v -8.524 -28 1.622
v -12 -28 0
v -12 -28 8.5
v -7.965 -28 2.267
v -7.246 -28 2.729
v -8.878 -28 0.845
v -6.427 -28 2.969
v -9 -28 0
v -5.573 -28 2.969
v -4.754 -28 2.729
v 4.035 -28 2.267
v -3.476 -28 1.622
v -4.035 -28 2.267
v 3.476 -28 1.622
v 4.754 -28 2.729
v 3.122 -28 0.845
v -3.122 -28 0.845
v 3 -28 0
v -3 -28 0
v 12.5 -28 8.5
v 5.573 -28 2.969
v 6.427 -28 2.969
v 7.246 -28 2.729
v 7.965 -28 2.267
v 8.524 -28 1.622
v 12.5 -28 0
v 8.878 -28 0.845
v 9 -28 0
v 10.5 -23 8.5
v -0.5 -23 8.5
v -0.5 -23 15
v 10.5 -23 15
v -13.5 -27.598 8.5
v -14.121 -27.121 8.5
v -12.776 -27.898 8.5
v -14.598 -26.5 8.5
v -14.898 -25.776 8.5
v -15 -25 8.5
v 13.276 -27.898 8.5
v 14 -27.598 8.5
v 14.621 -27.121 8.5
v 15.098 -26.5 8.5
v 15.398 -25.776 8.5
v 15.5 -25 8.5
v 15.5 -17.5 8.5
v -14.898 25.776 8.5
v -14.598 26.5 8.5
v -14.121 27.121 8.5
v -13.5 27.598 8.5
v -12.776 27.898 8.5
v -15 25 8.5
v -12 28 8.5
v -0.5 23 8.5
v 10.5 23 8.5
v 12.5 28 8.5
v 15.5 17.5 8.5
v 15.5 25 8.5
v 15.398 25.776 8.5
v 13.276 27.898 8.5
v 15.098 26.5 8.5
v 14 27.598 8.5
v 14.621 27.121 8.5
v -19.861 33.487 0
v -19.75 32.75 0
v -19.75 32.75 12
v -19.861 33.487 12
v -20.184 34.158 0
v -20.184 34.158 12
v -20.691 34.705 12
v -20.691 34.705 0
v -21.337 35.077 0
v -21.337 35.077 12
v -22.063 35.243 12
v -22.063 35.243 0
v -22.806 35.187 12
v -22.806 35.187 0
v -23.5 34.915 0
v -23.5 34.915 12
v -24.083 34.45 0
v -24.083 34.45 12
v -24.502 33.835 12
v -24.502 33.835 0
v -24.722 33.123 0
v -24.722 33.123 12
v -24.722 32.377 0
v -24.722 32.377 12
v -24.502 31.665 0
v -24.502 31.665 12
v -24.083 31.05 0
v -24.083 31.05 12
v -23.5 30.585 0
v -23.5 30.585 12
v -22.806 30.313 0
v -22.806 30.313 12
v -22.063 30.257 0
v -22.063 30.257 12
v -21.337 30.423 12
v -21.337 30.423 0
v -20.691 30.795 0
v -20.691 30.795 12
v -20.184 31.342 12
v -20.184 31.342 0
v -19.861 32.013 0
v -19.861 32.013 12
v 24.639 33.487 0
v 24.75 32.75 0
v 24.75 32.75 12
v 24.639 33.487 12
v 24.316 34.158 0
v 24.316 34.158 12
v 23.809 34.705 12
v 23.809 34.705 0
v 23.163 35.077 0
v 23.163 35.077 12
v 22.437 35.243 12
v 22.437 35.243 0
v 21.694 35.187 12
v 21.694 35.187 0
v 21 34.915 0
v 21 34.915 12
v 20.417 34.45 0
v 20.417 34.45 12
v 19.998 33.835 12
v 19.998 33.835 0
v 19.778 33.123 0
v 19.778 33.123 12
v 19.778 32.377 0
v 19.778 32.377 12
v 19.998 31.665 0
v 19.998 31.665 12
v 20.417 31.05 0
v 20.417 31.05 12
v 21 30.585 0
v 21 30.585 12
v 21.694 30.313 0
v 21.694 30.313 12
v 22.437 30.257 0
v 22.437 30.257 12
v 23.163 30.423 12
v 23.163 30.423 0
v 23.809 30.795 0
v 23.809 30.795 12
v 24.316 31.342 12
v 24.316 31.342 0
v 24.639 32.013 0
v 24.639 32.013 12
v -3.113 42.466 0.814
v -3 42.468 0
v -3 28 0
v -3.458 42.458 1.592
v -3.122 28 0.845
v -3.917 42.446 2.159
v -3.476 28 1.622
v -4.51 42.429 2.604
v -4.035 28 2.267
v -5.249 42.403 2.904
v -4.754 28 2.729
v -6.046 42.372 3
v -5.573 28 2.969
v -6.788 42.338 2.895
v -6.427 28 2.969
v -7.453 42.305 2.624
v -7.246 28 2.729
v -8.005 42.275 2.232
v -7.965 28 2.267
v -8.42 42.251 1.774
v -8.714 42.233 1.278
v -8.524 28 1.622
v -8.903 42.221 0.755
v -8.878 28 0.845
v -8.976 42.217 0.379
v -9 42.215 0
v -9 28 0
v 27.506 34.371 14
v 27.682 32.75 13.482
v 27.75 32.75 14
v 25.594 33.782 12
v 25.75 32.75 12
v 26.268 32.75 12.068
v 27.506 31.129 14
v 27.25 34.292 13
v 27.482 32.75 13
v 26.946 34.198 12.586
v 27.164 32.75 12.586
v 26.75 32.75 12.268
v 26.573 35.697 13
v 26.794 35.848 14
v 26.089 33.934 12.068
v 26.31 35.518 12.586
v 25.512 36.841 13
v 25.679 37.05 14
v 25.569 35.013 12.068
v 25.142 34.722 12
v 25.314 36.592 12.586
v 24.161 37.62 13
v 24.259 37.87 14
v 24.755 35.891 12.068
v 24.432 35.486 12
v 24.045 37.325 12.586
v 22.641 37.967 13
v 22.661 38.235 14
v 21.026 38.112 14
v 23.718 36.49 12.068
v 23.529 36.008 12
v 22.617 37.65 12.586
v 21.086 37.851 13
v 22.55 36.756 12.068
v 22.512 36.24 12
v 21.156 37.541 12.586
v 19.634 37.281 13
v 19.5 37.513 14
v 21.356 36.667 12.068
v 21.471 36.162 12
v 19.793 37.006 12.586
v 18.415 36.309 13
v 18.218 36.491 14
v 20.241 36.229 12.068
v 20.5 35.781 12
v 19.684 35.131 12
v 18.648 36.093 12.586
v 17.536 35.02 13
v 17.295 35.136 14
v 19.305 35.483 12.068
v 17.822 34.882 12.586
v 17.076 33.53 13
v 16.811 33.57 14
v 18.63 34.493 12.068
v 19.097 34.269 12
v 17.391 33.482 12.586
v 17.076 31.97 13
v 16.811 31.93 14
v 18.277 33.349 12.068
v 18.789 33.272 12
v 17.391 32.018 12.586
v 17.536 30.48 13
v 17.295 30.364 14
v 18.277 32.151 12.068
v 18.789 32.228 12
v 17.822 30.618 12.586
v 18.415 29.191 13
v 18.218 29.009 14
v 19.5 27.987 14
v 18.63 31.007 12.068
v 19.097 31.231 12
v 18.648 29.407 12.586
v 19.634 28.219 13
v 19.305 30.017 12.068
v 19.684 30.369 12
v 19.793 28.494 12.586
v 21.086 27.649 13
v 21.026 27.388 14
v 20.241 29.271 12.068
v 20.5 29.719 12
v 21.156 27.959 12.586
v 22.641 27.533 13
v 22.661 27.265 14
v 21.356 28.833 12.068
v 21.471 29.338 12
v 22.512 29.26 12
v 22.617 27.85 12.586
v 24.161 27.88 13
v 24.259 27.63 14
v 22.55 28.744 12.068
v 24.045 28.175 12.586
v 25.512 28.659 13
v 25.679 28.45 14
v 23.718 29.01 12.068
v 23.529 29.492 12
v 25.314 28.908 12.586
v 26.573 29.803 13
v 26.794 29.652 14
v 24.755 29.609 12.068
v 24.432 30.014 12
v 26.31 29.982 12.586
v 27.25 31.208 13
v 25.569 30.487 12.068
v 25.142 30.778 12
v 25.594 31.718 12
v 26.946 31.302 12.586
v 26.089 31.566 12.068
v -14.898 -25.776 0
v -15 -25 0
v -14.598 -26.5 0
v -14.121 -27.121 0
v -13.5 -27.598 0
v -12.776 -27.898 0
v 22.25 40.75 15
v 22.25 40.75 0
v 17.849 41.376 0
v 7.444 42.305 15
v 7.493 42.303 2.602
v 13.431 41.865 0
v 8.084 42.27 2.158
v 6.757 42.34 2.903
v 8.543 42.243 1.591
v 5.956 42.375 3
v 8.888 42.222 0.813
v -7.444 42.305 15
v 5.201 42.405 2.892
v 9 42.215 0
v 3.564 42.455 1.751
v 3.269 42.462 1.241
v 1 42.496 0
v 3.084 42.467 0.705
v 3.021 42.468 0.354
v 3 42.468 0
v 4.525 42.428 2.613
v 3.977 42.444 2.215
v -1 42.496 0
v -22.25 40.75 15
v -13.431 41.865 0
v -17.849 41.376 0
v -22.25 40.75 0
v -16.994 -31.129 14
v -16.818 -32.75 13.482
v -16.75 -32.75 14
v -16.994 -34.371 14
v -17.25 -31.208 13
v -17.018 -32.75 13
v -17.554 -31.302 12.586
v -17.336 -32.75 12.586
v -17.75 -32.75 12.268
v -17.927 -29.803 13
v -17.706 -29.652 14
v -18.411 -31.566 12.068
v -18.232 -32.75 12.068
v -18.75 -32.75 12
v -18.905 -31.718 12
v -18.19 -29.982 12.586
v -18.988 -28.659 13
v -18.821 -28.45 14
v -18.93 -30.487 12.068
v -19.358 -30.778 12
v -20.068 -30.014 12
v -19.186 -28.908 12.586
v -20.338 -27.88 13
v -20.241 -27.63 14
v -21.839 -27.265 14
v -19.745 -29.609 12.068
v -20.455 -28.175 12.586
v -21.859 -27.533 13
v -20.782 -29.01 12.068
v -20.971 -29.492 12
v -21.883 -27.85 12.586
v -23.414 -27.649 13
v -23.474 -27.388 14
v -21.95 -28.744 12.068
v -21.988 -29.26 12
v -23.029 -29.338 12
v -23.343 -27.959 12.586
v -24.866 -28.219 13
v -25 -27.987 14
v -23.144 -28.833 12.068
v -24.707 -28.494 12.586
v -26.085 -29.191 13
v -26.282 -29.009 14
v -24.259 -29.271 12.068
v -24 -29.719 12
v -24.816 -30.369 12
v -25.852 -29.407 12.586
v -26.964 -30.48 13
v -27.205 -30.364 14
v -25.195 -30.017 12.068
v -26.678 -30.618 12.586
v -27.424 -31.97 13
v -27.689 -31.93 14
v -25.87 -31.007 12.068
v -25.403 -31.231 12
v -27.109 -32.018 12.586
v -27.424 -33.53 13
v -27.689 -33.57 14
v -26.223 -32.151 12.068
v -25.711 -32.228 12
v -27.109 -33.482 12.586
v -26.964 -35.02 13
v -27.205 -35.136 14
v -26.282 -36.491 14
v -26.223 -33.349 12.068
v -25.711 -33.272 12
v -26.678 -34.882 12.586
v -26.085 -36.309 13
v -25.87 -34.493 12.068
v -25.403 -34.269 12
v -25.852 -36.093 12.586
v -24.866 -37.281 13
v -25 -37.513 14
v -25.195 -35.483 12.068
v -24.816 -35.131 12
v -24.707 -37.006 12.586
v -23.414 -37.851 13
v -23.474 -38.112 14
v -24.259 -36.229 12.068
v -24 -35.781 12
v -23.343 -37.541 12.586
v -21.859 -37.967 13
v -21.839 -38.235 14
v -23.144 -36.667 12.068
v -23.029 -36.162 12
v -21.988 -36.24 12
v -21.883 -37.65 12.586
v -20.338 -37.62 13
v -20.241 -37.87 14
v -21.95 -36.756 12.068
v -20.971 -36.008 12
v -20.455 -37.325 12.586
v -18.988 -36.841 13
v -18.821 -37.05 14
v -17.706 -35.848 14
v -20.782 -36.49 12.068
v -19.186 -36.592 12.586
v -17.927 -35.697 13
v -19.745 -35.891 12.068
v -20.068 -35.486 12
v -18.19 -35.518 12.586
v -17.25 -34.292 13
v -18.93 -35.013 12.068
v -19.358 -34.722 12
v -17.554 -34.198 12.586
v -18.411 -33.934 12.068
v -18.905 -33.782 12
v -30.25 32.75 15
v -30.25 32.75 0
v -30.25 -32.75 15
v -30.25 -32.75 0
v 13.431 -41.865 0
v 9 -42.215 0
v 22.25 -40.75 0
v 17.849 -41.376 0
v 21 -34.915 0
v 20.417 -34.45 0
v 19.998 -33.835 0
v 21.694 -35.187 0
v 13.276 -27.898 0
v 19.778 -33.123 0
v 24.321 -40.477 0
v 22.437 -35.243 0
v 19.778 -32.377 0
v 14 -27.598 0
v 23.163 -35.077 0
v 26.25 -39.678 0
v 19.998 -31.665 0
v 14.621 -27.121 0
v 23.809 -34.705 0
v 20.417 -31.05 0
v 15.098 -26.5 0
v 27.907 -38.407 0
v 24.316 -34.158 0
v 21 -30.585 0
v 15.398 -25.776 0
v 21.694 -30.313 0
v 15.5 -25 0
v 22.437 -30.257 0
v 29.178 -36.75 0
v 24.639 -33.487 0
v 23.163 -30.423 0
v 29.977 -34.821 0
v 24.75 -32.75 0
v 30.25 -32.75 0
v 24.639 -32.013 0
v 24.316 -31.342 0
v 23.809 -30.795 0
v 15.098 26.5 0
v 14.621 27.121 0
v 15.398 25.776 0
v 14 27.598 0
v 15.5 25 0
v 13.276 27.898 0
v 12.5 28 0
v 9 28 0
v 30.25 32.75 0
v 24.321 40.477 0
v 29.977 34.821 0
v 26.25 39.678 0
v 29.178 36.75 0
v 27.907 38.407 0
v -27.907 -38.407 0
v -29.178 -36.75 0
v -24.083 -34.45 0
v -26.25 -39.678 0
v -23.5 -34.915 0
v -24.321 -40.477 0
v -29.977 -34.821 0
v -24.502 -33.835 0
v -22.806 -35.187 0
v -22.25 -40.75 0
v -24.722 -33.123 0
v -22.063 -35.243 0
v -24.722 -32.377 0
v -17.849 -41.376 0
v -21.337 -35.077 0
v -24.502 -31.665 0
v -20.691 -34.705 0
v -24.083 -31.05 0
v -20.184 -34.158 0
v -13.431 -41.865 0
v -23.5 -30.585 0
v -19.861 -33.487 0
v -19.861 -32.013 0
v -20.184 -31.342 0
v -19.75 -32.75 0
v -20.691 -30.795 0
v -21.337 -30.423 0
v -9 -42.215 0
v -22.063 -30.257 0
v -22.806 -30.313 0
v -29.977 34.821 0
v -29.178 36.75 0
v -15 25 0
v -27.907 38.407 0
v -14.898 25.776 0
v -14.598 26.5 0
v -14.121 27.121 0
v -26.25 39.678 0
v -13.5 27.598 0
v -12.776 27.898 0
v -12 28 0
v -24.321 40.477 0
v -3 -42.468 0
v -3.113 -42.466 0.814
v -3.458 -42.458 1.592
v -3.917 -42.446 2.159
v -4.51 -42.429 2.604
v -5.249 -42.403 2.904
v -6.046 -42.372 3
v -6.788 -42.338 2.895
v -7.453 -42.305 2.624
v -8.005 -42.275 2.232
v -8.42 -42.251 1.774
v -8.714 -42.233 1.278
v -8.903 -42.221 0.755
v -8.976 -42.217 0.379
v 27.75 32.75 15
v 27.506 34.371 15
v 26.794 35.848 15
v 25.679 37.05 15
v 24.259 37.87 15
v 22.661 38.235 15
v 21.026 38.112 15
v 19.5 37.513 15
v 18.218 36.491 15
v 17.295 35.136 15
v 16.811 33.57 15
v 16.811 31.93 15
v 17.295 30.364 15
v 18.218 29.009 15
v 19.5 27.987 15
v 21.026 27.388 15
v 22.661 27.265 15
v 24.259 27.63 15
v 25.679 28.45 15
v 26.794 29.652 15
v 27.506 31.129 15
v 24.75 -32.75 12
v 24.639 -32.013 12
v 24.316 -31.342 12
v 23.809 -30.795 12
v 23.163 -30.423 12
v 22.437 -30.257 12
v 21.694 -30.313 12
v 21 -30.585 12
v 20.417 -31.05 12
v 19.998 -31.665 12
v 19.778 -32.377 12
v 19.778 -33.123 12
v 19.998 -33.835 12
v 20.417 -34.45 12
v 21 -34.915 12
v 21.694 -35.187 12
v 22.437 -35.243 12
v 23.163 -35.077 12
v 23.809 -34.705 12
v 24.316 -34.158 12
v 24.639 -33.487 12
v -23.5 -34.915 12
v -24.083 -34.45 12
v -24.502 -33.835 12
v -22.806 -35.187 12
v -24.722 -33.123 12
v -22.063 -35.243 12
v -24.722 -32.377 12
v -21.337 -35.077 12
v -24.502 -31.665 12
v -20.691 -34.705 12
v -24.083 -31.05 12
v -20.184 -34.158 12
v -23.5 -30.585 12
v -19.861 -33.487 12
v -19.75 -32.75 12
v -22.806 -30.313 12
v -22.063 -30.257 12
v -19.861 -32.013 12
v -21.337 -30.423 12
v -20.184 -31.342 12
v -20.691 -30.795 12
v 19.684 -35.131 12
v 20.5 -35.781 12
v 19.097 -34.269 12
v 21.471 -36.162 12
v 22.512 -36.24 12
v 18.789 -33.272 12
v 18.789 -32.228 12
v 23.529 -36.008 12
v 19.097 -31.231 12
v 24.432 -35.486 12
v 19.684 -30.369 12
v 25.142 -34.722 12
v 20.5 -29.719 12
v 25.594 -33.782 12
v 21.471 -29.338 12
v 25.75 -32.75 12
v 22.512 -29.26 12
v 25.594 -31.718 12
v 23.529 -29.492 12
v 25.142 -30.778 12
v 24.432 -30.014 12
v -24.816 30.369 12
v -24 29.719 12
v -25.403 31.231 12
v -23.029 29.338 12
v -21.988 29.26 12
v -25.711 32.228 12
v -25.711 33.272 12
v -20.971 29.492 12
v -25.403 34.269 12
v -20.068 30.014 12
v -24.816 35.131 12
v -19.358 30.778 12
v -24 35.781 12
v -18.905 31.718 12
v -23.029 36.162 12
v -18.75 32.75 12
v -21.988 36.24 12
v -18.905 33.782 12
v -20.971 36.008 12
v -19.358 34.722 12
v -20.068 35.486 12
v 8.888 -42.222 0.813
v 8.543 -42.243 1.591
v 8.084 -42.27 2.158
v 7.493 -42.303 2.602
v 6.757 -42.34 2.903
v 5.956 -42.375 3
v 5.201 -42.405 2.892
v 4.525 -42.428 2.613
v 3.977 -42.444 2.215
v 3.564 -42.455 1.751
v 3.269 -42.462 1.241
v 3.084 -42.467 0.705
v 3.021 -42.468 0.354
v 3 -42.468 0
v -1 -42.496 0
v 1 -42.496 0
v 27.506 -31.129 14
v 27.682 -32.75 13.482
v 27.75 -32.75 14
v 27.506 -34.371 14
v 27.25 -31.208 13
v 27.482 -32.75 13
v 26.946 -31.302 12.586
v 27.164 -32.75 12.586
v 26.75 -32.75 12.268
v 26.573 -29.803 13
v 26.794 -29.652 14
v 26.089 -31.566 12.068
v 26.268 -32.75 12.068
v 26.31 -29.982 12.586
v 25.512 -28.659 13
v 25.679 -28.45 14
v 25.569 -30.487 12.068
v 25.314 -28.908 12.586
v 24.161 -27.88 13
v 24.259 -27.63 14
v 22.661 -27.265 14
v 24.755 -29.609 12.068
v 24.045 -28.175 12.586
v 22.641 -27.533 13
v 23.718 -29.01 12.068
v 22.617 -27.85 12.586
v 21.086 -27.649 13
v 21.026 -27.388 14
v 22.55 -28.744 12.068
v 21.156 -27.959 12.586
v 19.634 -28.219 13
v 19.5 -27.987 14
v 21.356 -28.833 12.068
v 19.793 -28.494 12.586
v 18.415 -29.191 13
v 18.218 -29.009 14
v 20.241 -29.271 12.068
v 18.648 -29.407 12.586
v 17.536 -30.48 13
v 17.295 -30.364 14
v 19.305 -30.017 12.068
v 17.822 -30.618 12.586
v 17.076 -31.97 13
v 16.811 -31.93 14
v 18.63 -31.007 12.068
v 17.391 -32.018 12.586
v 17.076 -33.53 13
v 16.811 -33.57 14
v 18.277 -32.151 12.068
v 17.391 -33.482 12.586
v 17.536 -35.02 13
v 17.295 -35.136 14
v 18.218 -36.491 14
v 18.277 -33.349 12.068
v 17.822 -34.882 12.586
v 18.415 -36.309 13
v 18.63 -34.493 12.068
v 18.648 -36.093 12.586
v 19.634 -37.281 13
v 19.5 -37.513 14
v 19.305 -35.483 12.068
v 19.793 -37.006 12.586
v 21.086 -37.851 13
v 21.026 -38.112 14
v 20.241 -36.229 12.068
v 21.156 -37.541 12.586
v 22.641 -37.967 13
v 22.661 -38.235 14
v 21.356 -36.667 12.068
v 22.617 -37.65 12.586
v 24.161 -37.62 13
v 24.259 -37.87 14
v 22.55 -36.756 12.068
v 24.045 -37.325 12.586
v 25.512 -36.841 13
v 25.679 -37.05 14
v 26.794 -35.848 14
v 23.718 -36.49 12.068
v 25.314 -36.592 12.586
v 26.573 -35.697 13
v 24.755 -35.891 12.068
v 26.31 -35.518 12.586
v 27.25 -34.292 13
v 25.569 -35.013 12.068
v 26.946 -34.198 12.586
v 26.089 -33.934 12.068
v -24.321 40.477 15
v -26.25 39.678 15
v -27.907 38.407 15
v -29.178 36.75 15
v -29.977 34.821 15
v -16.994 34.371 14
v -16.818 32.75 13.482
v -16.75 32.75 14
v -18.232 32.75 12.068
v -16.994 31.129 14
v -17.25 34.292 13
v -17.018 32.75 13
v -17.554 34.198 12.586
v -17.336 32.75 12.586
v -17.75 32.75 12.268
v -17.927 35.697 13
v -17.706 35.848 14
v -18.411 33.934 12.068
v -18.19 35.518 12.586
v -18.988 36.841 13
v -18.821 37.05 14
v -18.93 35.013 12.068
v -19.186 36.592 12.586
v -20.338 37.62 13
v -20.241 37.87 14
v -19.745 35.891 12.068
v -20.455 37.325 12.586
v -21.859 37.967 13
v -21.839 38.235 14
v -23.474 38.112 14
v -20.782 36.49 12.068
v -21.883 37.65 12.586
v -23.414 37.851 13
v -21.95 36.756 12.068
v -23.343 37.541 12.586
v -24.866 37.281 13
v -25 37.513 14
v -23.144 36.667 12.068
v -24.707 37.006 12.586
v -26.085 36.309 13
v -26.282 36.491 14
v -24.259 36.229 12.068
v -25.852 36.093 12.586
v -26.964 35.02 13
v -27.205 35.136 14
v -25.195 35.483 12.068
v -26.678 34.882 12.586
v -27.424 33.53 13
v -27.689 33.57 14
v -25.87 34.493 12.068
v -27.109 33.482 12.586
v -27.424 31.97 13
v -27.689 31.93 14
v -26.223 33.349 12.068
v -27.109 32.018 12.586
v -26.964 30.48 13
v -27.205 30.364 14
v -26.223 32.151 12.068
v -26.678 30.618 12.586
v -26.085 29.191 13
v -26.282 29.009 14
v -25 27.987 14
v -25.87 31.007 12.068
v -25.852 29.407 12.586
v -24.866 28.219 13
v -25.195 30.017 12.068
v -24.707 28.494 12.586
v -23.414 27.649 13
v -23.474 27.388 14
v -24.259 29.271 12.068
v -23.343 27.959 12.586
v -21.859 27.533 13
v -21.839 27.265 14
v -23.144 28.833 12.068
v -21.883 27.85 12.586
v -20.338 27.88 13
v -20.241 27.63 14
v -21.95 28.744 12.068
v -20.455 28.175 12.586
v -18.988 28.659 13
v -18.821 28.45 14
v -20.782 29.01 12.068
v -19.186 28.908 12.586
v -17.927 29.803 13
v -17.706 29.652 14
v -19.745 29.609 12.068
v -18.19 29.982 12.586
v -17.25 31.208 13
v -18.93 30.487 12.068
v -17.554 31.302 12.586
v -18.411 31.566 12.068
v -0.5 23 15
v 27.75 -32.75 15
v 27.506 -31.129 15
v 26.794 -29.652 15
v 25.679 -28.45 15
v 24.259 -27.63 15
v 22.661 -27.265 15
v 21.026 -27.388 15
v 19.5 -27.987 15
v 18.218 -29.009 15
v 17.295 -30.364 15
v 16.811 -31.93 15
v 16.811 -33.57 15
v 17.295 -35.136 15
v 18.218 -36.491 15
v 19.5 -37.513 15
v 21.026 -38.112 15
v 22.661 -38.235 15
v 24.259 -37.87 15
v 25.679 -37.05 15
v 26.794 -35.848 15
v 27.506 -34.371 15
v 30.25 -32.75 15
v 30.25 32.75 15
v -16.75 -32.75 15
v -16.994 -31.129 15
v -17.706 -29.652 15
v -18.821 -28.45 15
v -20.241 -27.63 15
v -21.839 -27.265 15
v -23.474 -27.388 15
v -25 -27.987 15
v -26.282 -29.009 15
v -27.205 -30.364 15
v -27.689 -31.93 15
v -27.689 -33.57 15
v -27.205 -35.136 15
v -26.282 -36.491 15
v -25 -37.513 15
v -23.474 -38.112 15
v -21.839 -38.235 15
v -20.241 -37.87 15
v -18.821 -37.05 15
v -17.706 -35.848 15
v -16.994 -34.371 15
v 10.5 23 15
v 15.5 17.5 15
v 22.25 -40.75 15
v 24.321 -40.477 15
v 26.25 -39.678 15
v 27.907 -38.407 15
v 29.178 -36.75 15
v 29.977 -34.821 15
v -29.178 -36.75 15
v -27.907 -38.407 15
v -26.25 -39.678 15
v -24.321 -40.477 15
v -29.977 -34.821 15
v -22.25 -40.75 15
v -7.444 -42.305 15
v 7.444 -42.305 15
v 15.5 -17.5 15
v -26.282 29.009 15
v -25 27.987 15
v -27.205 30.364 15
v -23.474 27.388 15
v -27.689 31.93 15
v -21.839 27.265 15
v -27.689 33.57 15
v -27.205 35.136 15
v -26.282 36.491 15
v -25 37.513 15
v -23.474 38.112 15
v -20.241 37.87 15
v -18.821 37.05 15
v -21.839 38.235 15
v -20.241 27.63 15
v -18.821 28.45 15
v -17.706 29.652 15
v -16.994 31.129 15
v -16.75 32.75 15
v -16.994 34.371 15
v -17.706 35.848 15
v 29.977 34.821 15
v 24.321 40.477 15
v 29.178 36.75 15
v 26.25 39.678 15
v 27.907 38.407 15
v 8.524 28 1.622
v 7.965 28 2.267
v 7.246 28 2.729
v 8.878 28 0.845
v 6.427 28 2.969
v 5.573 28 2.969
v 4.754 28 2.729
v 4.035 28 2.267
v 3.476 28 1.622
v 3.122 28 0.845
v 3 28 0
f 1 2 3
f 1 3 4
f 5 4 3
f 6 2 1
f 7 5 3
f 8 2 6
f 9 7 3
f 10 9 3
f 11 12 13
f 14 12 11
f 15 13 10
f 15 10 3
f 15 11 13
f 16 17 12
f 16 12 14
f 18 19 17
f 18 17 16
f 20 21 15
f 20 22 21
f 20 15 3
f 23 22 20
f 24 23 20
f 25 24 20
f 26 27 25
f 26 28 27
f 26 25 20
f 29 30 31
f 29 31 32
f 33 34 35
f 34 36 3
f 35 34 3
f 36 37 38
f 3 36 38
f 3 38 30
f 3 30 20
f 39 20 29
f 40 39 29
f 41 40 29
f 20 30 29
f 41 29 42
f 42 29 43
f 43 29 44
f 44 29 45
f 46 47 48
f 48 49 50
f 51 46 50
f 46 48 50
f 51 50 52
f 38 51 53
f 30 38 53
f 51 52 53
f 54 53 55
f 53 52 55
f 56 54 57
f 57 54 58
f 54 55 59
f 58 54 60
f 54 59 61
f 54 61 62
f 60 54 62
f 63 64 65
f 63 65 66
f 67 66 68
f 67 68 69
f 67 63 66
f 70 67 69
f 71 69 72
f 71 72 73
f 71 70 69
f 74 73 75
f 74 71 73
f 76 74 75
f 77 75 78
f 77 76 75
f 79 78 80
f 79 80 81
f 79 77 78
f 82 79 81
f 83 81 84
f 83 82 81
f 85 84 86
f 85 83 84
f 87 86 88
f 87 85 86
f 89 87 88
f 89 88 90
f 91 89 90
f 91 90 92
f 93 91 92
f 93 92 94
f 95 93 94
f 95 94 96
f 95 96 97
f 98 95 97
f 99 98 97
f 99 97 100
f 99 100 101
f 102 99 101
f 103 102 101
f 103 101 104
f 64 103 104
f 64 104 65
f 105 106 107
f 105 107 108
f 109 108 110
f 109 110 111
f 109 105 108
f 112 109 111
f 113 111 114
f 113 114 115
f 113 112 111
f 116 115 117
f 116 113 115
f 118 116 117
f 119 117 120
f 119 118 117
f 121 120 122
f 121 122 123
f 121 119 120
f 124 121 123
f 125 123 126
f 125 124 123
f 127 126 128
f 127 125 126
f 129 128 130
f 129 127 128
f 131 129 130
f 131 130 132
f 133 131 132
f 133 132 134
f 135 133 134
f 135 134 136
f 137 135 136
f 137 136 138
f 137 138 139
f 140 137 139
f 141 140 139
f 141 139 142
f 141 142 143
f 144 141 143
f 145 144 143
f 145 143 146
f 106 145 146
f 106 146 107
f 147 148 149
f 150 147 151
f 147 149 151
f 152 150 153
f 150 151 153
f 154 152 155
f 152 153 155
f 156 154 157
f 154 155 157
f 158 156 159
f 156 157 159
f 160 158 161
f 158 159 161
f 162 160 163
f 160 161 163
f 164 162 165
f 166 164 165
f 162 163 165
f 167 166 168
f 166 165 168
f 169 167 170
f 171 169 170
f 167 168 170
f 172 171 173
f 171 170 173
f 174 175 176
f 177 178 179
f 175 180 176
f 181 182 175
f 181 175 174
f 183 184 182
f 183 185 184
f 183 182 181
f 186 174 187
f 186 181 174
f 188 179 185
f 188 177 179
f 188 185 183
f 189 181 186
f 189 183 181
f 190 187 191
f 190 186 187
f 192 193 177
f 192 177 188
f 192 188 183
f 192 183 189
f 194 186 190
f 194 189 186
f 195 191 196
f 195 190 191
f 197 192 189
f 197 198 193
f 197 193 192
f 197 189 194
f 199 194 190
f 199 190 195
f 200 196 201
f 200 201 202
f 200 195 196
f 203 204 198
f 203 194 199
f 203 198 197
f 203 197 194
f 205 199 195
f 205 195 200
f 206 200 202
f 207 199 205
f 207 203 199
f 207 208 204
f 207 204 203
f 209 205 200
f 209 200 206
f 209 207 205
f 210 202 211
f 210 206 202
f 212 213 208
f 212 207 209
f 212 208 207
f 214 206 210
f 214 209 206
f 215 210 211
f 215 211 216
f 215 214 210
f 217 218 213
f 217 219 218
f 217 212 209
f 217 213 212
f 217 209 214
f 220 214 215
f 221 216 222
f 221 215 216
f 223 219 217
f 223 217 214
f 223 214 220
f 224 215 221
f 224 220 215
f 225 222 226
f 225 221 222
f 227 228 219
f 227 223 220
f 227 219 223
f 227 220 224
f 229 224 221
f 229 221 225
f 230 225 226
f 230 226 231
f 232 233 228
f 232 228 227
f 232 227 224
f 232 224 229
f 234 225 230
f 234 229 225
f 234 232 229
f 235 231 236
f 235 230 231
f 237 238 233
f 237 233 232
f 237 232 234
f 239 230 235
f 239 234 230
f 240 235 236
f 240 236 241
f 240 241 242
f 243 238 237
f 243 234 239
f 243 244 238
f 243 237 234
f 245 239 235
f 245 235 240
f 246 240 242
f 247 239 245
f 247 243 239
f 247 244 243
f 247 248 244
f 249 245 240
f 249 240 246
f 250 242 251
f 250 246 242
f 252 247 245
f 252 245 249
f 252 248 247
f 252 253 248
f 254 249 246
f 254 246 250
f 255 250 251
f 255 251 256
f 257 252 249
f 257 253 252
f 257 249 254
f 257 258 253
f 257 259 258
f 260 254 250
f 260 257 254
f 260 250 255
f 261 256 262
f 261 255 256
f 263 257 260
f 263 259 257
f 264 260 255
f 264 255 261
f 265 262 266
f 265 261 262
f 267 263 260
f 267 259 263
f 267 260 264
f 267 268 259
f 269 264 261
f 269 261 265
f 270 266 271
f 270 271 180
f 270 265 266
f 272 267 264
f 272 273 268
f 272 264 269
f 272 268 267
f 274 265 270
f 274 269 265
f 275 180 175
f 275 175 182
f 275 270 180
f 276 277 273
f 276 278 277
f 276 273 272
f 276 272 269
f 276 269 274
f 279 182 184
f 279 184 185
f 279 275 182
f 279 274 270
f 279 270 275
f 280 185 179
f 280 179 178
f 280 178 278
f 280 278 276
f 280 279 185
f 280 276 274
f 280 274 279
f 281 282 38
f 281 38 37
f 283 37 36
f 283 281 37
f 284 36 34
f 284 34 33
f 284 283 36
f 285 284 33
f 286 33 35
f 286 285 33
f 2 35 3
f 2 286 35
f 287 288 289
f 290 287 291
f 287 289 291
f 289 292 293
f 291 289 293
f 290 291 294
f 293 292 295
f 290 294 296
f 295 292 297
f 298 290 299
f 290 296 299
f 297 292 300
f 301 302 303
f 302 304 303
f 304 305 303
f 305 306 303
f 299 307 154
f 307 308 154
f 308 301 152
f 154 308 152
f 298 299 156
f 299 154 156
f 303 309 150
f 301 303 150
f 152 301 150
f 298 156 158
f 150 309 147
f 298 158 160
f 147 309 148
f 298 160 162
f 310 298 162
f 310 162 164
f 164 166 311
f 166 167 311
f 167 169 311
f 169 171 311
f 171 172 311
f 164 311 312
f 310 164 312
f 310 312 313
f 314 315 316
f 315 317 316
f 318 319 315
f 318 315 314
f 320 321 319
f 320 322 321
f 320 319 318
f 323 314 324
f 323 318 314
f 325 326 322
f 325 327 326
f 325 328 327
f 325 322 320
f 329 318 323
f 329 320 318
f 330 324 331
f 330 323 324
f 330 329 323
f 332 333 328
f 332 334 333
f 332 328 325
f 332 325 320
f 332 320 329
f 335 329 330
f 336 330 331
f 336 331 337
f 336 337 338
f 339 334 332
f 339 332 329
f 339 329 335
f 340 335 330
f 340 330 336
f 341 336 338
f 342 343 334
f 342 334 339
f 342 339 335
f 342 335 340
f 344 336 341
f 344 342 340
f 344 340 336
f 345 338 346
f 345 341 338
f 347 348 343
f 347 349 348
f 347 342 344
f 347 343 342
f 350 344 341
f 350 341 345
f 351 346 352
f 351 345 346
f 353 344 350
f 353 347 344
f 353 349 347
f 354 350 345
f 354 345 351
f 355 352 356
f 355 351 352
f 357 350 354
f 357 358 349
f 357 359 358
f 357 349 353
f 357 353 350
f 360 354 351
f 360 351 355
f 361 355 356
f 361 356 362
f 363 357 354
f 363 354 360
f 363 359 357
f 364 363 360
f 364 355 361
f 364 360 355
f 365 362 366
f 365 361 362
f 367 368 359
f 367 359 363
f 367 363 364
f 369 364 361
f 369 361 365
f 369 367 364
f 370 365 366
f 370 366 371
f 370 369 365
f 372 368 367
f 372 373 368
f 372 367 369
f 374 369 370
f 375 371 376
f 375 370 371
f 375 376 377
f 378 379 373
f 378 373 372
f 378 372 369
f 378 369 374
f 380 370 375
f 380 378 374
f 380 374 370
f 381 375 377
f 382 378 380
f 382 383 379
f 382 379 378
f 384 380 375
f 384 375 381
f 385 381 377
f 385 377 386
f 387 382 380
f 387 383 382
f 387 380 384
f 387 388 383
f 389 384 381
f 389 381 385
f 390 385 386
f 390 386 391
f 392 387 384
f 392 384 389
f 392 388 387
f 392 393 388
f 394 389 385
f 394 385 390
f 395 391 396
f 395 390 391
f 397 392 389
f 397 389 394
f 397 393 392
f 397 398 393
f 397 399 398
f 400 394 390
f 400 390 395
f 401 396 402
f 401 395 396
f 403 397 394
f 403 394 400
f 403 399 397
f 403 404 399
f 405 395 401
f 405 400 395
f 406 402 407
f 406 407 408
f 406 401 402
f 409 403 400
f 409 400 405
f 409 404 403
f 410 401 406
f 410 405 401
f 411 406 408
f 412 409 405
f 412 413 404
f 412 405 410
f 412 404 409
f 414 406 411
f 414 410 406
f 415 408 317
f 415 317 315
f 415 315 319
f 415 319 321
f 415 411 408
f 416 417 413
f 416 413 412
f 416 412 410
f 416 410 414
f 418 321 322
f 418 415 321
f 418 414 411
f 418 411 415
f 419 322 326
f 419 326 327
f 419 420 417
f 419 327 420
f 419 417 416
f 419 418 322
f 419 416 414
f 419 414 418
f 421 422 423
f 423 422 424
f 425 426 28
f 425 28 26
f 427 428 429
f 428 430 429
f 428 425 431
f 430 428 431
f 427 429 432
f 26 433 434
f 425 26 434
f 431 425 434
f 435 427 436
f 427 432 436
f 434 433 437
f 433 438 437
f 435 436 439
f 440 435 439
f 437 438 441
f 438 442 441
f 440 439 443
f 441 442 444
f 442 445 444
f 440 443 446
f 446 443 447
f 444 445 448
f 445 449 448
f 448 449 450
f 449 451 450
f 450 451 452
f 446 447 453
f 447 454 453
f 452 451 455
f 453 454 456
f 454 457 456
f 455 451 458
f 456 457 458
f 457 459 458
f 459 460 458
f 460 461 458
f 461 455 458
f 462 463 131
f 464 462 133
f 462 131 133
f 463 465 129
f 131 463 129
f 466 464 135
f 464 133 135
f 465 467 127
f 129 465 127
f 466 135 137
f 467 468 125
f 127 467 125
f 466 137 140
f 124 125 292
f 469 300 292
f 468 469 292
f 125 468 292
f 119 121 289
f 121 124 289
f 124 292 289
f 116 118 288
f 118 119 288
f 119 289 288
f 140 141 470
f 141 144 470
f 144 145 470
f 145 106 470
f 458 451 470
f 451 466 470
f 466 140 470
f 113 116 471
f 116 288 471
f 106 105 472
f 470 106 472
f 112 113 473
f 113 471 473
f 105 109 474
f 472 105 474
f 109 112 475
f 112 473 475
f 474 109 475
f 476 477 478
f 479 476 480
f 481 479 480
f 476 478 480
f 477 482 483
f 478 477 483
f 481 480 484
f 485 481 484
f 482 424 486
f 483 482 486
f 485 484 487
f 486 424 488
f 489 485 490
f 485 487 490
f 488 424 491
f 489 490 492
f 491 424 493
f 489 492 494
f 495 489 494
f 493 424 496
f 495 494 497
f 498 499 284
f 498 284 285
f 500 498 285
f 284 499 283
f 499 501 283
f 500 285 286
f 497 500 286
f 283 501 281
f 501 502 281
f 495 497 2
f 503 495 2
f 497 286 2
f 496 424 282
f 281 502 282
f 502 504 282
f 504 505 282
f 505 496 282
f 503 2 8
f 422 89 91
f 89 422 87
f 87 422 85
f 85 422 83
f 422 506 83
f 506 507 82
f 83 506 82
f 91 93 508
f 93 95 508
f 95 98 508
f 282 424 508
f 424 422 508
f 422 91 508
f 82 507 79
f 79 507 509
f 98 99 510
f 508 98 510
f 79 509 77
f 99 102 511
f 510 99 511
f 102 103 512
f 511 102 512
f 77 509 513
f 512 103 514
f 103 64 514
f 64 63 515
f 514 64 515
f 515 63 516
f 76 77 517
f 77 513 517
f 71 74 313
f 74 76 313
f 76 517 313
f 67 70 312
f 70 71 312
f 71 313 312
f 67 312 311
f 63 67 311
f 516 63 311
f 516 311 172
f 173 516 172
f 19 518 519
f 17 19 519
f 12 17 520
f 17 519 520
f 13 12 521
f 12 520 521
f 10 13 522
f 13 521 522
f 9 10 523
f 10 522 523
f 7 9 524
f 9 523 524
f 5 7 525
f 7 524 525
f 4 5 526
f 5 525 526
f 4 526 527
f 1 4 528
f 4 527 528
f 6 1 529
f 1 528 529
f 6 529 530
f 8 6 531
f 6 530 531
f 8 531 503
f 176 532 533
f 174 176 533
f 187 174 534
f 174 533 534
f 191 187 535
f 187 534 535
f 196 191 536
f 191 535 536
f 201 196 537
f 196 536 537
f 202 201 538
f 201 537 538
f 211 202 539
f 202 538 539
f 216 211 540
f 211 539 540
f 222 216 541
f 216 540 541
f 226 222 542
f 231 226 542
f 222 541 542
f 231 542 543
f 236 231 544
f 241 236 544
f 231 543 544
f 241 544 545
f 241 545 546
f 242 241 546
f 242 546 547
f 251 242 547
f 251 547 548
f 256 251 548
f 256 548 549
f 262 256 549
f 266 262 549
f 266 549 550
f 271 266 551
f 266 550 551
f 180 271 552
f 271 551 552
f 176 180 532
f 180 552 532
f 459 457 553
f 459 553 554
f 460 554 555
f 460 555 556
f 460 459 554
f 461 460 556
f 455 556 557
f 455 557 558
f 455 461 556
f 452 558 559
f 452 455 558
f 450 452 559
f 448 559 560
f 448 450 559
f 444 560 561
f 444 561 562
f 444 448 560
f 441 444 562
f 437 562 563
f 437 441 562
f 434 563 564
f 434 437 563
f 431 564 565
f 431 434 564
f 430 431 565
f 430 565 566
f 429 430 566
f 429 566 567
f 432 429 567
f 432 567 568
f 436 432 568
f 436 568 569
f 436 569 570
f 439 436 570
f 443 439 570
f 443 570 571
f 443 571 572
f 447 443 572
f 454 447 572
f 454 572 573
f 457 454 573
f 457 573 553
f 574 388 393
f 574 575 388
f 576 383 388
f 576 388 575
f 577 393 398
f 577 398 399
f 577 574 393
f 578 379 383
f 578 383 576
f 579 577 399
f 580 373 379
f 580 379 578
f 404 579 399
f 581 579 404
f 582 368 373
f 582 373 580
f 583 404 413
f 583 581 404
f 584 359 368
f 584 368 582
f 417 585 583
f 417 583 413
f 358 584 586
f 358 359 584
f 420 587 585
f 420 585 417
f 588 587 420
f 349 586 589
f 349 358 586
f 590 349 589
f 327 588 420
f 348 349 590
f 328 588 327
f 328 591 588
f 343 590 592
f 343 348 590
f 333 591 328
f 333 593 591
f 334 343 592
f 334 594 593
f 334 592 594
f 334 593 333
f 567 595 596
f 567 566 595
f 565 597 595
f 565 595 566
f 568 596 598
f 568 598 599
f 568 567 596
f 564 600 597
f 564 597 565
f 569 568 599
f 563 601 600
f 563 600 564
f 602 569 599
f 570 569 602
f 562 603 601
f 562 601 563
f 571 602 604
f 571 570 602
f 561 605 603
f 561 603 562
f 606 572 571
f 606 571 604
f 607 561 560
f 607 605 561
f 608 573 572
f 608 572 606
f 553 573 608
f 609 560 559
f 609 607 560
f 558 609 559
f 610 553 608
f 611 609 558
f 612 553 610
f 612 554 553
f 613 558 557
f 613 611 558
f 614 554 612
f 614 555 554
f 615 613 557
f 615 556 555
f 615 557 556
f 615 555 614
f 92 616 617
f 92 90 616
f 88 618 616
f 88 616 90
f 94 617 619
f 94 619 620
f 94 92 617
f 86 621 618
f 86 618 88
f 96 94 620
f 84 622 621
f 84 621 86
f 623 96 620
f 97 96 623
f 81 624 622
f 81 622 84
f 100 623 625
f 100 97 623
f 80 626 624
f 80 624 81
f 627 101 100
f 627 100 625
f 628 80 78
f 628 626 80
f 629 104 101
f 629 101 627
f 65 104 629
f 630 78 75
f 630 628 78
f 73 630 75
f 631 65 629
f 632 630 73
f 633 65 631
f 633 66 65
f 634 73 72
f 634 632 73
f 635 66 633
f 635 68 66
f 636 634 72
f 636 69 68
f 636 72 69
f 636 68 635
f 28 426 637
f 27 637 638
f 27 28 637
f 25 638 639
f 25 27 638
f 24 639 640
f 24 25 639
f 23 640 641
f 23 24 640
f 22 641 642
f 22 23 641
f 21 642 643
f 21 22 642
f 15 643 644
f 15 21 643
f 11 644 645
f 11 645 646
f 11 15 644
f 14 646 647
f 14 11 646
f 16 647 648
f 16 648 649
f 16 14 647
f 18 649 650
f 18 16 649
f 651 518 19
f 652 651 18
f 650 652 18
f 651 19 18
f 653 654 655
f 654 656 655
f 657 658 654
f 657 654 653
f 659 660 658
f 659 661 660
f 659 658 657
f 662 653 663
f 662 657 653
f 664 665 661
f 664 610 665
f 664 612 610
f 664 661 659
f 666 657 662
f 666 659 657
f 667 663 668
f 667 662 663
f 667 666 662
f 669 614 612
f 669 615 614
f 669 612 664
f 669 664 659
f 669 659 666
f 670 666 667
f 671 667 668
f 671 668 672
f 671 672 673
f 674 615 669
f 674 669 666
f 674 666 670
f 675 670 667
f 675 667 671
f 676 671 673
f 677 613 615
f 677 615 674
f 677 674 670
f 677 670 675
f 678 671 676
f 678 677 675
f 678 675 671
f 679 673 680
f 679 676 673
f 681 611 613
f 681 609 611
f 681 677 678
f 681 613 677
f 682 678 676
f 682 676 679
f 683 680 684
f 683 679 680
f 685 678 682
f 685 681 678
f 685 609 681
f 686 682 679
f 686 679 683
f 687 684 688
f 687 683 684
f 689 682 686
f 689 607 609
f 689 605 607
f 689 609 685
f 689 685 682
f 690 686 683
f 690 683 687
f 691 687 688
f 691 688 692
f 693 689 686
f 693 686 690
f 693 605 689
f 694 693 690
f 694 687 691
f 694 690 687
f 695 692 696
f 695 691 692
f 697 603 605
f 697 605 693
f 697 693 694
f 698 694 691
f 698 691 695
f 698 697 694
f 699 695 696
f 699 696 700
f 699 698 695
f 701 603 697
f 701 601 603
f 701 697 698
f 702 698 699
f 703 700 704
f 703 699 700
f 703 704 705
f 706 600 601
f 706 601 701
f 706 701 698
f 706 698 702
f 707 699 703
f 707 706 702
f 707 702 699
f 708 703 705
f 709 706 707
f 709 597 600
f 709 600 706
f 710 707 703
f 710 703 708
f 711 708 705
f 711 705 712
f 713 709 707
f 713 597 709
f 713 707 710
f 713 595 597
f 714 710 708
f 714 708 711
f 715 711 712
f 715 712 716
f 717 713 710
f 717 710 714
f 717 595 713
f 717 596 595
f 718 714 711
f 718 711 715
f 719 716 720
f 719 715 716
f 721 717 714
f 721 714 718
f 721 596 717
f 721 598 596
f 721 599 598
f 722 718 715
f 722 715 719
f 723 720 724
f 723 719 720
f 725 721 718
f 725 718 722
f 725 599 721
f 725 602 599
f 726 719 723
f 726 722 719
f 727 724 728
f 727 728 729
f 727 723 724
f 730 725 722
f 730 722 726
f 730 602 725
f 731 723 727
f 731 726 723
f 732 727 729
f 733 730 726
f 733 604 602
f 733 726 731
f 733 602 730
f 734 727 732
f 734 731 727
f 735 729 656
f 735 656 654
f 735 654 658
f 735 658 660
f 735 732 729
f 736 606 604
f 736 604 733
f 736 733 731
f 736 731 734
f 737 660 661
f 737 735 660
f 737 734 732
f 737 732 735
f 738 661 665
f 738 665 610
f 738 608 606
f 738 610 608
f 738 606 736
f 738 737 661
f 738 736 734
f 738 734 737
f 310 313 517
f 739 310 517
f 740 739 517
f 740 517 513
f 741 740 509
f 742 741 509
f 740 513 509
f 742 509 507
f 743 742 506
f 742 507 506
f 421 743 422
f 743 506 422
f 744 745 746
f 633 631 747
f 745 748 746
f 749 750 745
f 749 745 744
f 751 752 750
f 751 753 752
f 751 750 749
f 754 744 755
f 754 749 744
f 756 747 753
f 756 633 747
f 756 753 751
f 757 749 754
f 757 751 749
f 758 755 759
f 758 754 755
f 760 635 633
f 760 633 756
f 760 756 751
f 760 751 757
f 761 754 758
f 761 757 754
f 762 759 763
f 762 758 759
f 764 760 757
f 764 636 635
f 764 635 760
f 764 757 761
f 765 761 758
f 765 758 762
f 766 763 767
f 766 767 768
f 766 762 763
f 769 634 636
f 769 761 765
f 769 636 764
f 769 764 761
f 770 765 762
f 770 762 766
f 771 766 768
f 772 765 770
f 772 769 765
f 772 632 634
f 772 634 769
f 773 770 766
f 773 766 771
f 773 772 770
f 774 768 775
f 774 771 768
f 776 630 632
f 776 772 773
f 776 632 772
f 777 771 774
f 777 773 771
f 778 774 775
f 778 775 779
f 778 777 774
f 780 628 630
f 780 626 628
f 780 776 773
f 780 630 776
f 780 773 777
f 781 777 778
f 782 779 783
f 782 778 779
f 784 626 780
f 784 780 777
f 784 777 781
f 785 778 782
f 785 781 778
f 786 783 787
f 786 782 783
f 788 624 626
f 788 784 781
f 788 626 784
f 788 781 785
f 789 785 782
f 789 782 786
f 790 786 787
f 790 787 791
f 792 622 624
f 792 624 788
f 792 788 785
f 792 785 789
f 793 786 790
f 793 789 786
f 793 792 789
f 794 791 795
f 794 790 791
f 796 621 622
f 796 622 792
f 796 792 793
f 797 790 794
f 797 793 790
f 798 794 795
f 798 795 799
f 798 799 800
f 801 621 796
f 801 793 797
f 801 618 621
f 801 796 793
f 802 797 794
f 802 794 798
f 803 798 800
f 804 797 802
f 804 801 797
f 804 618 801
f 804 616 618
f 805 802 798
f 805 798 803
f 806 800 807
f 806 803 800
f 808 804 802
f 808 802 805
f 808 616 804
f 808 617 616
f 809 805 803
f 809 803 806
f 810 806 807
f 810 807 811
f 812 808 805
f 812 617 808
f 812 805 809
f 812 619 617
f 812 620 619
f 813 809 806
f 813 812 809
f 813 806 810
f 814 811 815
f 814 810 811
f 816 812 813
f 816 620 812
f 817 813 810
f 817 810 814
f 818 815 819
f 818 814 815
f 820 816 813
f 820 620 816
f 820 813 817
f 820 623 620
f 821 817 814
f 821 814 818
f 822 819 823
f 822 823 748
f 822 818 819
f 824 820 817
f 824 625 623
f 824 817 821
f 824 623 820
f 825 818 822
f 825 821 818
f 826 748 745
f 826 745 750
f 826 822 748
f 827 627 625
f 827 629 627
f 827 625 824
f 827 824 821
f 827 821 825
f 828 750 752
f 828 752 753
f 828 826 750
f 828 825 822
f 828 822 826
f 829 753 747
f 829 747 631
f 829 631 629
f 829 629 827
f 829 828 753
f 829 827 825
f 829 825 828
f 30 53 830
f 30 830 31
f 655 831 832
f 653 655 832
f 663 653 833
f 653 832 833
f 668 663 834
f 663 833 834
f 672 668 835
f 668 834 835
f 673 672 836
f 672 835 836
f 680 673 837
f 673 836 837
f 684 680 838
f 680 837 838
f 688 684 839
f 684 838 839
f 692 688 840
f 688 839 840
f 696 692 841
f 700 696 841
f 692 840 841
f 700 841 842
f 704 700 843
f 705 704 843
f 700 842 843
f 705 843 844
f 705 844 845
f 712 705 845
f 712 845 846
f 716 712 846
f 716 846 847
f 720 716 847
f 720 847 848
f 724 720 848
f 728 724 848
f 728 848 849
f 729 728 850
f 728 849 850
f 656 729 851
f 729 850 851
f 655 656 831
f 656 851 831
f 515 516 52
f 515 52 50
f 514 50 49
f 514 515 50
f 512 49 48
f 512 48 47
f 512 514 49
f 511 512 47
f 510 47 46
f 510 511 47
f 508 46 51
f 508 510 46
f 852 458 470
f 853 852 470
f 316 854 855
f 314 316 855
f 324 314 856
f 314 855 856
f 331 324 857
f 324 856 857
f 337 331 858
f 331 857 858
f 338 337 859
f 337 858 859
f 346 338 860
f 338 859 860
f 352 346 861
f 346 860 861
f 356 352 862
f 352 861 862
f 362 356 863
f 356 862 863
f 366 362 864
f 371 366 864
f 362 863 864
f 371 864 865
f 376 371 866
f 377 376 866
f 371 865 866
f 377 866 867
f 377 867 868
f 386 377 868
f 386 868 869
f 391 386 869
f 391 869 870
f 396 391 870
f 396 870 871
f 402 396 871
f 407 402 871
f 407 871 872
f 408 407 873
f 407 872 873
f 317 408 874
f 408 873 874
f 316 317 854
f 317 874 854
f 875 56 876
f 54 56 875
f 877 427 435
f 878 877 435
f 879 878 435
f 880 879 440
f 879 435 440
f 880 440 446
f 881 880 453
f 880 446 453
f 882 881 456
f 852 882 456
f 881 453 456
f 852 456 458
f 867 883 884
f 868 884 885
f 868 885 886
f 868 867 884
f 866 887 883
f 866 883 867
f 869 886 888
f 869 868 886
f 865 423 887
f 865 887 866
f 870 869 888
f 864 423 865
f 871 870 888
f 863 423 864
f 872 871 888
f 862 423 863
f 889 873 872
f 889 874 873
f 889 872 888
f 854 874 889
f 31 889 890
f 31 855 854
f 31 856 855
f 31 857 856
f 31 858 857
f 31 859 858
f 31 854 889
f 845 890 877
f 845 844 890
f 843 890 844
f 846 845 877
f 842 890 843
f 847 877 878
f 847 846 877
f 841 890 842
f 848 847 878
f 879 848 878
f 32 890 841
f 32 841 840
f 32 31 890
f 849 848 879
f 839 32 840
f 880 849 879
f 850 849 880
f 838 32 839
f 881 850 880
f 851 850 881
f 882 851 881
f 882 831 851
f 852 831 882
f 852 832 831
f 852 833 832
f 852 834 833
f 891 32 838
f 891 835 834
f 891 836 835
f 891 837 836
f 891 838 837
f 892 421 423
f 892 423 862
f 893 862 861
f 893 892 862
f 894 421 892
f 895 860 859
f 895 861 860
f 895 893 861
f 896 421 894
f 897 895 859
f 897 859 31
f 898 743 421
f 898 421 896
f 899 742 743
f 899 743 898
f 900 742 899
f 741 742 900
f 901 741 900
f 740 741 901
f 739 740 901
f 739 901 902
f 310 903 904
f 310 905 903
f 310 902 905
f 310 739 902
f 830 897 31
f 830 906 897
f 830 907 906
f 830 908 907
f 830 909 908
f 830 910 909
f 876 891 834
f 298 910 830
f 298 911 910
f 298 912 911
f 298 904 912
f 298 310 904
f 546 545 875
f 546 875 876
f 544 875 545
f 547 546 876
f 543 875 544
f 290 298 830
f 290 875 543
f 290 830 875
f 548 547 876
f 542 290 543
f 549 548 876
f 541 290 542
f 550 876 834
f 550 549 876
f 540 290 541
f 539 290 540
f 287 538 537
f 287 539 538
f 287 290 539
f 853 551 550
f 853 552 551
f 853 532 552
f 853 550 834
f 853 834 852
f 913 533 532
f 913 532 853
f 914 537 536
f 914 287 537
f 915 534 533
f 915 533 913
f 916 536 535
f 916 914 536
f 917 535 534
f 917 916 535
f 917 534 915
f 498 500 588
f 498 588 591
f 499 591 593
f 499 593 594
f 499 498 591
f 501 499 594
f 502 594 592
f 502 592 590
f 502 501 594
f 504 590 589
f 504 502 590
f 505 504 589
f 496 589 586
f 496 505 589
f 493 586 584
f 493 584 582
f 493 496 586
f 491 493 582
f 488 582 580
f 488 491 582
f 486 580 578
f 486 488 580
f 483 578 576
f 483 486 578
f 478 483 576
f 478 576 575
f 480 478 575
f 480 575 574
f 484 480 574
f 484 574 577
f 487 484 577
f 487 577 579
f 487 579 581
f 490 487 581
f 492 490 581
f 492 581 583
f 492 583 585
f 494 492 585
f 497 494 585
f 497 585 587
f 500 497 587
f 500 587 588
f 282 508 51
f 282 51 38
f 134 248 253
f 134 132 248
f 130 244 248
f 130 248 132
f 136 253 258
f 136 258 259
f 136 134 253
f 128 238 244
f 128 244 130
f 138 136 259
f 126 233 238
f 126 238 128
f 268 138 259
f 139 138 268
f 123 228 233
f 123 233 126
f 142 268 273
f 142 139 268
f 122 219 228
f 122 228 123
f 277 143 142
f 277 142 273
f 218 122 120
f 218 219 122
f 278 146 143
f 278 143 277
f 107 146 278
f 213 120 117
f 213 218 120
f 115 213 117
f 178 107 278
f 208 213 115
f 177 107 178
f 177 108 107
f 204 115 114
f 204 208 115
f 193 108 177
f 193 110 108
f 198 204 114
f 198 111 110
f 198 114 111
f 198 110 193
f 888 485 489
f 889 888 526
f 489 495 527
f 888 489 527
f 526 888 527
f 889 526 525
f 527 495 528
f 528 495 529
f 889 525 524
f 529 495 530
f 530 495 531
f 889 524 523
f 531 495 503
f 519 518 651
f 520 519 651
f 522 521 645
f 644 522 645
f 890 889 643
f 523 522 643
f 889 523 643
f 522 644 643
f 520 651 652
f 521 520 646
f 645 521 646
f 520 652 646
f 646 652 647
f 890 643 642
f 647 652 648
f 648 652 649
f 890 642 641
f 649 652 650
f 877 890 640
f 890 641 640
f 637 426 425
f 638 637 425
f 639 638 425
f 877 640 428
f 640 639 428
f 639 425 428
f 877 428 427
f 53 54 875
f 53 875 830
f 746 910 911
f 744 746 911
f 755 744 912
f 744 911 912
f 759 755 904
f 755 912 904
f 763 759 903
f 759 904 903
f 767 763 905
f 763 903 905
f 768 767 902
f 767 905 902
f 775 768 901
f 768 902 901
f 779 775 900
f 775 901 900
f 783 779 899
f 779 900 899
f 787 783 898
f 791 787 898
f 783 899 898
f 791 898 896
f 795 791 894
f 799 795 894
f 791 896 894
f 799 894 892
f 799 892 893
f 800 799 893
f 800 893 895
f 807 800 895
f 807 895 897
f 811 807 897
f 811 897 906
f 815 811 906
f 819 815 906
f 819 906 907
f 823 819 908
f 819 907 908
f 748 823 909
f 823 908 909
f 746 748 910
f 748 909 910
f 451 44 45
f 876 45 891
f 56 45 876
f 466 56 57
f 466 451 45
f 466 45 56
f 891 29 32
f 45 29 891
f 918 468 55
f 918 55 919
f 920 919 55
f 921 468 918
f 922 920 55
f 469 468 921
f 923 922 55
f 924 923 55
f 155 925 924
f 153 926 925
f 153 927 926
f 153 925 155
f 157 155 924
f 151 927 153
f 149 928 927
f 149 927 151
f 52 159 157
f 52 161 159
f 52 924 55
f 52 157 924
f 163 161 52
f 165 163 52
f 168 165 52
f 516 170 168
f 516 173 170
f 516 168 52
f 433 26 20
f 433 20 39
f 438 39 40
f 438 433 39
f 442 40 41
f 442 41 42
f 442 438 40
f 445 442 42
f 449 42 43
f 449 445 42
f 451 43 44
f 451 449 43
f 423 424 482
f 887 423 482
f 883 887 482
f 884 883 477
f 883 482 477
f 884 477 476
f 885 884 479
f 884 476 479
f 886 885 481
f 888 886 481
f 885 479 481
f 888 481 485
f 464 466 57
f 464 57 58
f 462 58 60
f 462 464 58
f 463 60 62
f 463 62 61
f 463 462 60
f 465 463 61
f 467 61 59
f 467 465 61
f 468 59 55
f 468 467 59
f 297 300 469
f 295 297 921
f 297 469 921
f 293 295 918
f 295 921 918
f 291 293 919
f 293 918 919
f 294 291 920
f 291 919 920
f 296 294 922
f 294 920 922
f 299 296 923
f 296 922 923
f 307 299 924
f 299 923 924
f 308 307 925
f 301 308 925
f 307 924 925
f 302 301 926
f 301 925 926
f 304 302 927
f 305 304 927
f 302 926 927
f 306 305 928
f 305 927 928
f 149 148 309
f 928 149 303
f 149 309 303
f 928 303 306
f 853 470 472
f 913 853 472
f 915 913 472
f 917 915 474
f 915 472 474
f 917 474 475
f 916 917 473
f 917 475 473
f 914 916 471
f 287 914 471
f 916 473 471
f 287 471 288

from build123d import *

# Parameters (mm, degrees)
F0_R      = 5.5
F0_R_2    = 2.5
F1_DEPTH  = 15
F2_R      = 5.5
F2_R_2    = 2.5
F3_DEPTH  = 3
F7_DEPTH  = 16
F9_DEPTH  = 8.5
F10_R     = 2
F4_R      = 3
F11_DEPTH = 43


# Not quite as in the source:
# - a feature names something its author has since deleted; it is built from what else it names


with BuildPart() as f1:
    # F0 (on Top) → F1 (new body)
    with BuildSketch(Plane.XY):
        with BuildLine():
            Line((30.2499662921, -32.75), (30.2499662921, 32.75))
            ThreePointArc((30.2499662921, 32.75), (27.9068205416, 38.4068542495), (22.2499662921, 40.75))
            ThreePointArc((22.2499662921, 40.75), (0, 42.5), (-22.2499662921, 40.75))
            ThreePointArc((-22.2499662921, 40.75), (-27.9068192027, 38.4068555884), (-30.2499662921, 32.7500037869))
            Line((-30.2499662921, 32.7500037869), (-30.2499662921, -32.75))
            ThreePointArc((-30.2499662921, -32.75), (-27.9068205416, -38.4068542495), (-22.2499662921, -40.75))
            ThreePointArc((-22.2499662921, -40.75), (0, -42.5), (22.2499662921, -40.75))
            ThreePointArc((22.2499662921, -40.75), (27.9068205416, -38.4068542495), (30.2499662921, -32.75))
        make_face()
        with Locations((-22.2499662921, -32.75)):
            Circle(F0_R, mode=Mode.SUBTRACT)
        with Locations((22.2499662921, -32.75)):
            Circle(F0_R, mode=Mode.SUBTRACT)
        with Locations((-22.2499662921, 32.75)):
            Circle(F0_R, mode=Mode.SUBTRACT)
        with Locations((22.2499662921, 32.75)):
            Circle(F0_R, mode=Mode.SUBTRACT)
        with Locations((-22.2499662921, 32.75)):
            Circle(F0_R)
        with Locations((-22.2499662921, 32.75)):
            Circle(F0_R_2, mode=Mode.SUBTRACT)
        with Locations((22.2499662921, 32.75)):
            Circle(F0_R)
        with Locations((22.2499662921, 32.75)):
            Circle(F0_R_2, mode=Mode.SUBTRACT)
        with Locations((22.2499662921, -32.75)):
            Circle(F0_R)
        with Locations((22.2499662921, -32.75)):
            Circle(F0_R_2, mode=Mode.SUBTRACT)
        with Locations((-22.2499662921, -32.75)):
            Circle(F0_R)
        with Locations((-22.2499662921, -32.75)):
            Circle(F0_R_2, mode=Mode.SUBTRACT)
    extrude(amount=F1_DEPTH)

    # F2 (on face) → F3 (cut)
    with BuildSketch(Plane.XY.offset(15)):
        with Locations((-22.2499662921, 32.75)):
            Circle(F2_R)
        with Locations((-22.2499662921, 32.75)):
            Circle(F2_R_2, mode=Mode.SUBTRACT)
        with Locations((22.2499662921, 32.75)):
            Circle(F2_R)
        with Locations((22.2499662921, 32.75)):
            Circle(F2_R_2, mode=Mode.SUBTRACT)
        with Locations((22.2499662921, -32.75)):
            Circle(F2_R)
        with Locations((22.2499662921, -32.75)):
            Circle(F2_R_2, mode=Mode.SUBTRACT)
        with Locations((-22.2499662921, -32.75)):
            Circle(F2_R)
        with Locations((-22.2499662921, -32.75)):
            Circle(F2_R_2, mode=Mode.SUBTRACT)
    extrude(amount=-F3_DEPTH, mode=Mode.SUBTRACT)

    # F6 (on Top) + F5 (on Top) → F7 (cut)
    with BuildSketch(Plane.XY):
        Polygon((-0.5, 23), (-0.5, 0), (-0.5, -23), (10.5, -23), (15.5, -17.5), (15.5, 0), (15.5, 17.5), (10.5, 23), align=None)
    with BuildSketch(Plane.XY):
        Polygon((10.5, 22.5), (0, 22.5), (0, -22.5), (10.5, -22.5), (15, -17.5), (15, 17.5), align=None)
    extrude(amount=F7_DEPTH, mode=Mode.SUBTRACT)

    # F8 (on face) → F9 (cut)
    with BuildSketch(Plane.XY):
        with BuildLine():
            Line((10.5, 23), (15.5, 17.5))
            Line((15.5, 17.5), (15.5, 25))
            ThreePointArc((15.5, 25), (14.6213203436, 27.1213203436), (12.5, 28))
            Line((12.5, 28), (-12, 28))
            ThreePointArc((-12, 28), (-14.1213203436, 27.1213203436), (-15, 25))
            Line((-15, 25), (-15, -25))
            ThreePointArc((-15, -25), (-14.1213203436, -27.1213203436), (-12, -28))
            Line((-12, -28), (12.5, -28))
            ThreePointArc((12.5, -28), (14.6213203436, -27.1213203436), (15.5, -25))
            Line((15.5, -25), (15.5, -17.5))
            Line((15.5, -17.5), (10.5, -23))
            Line((10.5, -23), (-0.5, -23))
            Line((-0.5, -23), (-0.5, 23))
            Line((-0.5, 23), (10.5, 23))
        make_face()
    extrude(amount=F9_DEPTH, mode=Mode.SUBTRACT)

    # F10
    f10_edges = [f1.edges().sort_by_distance(p)[0] for p in [
        (-27.749966, -32.75, 12),
        (16.749966, -32.75, 12),
        (-27.749966, 32.75, 12),
        (16.749966, 32.75, 12),
    ]]
    fillet(f10_edges, radius=F10_R)

    # F4 (on Front) → F11 (cut, symmetric)
    with BuildSketch(Plane.XZ):
        with Locations((6, 0)):
            Circle(F4_R)
        with Locations((-6, 0)):
            Circle(F4_R)
    extrude(amount=F11_DEPTH, both=True, mode=Mode.SUBTRACT)


solid = f1.part
